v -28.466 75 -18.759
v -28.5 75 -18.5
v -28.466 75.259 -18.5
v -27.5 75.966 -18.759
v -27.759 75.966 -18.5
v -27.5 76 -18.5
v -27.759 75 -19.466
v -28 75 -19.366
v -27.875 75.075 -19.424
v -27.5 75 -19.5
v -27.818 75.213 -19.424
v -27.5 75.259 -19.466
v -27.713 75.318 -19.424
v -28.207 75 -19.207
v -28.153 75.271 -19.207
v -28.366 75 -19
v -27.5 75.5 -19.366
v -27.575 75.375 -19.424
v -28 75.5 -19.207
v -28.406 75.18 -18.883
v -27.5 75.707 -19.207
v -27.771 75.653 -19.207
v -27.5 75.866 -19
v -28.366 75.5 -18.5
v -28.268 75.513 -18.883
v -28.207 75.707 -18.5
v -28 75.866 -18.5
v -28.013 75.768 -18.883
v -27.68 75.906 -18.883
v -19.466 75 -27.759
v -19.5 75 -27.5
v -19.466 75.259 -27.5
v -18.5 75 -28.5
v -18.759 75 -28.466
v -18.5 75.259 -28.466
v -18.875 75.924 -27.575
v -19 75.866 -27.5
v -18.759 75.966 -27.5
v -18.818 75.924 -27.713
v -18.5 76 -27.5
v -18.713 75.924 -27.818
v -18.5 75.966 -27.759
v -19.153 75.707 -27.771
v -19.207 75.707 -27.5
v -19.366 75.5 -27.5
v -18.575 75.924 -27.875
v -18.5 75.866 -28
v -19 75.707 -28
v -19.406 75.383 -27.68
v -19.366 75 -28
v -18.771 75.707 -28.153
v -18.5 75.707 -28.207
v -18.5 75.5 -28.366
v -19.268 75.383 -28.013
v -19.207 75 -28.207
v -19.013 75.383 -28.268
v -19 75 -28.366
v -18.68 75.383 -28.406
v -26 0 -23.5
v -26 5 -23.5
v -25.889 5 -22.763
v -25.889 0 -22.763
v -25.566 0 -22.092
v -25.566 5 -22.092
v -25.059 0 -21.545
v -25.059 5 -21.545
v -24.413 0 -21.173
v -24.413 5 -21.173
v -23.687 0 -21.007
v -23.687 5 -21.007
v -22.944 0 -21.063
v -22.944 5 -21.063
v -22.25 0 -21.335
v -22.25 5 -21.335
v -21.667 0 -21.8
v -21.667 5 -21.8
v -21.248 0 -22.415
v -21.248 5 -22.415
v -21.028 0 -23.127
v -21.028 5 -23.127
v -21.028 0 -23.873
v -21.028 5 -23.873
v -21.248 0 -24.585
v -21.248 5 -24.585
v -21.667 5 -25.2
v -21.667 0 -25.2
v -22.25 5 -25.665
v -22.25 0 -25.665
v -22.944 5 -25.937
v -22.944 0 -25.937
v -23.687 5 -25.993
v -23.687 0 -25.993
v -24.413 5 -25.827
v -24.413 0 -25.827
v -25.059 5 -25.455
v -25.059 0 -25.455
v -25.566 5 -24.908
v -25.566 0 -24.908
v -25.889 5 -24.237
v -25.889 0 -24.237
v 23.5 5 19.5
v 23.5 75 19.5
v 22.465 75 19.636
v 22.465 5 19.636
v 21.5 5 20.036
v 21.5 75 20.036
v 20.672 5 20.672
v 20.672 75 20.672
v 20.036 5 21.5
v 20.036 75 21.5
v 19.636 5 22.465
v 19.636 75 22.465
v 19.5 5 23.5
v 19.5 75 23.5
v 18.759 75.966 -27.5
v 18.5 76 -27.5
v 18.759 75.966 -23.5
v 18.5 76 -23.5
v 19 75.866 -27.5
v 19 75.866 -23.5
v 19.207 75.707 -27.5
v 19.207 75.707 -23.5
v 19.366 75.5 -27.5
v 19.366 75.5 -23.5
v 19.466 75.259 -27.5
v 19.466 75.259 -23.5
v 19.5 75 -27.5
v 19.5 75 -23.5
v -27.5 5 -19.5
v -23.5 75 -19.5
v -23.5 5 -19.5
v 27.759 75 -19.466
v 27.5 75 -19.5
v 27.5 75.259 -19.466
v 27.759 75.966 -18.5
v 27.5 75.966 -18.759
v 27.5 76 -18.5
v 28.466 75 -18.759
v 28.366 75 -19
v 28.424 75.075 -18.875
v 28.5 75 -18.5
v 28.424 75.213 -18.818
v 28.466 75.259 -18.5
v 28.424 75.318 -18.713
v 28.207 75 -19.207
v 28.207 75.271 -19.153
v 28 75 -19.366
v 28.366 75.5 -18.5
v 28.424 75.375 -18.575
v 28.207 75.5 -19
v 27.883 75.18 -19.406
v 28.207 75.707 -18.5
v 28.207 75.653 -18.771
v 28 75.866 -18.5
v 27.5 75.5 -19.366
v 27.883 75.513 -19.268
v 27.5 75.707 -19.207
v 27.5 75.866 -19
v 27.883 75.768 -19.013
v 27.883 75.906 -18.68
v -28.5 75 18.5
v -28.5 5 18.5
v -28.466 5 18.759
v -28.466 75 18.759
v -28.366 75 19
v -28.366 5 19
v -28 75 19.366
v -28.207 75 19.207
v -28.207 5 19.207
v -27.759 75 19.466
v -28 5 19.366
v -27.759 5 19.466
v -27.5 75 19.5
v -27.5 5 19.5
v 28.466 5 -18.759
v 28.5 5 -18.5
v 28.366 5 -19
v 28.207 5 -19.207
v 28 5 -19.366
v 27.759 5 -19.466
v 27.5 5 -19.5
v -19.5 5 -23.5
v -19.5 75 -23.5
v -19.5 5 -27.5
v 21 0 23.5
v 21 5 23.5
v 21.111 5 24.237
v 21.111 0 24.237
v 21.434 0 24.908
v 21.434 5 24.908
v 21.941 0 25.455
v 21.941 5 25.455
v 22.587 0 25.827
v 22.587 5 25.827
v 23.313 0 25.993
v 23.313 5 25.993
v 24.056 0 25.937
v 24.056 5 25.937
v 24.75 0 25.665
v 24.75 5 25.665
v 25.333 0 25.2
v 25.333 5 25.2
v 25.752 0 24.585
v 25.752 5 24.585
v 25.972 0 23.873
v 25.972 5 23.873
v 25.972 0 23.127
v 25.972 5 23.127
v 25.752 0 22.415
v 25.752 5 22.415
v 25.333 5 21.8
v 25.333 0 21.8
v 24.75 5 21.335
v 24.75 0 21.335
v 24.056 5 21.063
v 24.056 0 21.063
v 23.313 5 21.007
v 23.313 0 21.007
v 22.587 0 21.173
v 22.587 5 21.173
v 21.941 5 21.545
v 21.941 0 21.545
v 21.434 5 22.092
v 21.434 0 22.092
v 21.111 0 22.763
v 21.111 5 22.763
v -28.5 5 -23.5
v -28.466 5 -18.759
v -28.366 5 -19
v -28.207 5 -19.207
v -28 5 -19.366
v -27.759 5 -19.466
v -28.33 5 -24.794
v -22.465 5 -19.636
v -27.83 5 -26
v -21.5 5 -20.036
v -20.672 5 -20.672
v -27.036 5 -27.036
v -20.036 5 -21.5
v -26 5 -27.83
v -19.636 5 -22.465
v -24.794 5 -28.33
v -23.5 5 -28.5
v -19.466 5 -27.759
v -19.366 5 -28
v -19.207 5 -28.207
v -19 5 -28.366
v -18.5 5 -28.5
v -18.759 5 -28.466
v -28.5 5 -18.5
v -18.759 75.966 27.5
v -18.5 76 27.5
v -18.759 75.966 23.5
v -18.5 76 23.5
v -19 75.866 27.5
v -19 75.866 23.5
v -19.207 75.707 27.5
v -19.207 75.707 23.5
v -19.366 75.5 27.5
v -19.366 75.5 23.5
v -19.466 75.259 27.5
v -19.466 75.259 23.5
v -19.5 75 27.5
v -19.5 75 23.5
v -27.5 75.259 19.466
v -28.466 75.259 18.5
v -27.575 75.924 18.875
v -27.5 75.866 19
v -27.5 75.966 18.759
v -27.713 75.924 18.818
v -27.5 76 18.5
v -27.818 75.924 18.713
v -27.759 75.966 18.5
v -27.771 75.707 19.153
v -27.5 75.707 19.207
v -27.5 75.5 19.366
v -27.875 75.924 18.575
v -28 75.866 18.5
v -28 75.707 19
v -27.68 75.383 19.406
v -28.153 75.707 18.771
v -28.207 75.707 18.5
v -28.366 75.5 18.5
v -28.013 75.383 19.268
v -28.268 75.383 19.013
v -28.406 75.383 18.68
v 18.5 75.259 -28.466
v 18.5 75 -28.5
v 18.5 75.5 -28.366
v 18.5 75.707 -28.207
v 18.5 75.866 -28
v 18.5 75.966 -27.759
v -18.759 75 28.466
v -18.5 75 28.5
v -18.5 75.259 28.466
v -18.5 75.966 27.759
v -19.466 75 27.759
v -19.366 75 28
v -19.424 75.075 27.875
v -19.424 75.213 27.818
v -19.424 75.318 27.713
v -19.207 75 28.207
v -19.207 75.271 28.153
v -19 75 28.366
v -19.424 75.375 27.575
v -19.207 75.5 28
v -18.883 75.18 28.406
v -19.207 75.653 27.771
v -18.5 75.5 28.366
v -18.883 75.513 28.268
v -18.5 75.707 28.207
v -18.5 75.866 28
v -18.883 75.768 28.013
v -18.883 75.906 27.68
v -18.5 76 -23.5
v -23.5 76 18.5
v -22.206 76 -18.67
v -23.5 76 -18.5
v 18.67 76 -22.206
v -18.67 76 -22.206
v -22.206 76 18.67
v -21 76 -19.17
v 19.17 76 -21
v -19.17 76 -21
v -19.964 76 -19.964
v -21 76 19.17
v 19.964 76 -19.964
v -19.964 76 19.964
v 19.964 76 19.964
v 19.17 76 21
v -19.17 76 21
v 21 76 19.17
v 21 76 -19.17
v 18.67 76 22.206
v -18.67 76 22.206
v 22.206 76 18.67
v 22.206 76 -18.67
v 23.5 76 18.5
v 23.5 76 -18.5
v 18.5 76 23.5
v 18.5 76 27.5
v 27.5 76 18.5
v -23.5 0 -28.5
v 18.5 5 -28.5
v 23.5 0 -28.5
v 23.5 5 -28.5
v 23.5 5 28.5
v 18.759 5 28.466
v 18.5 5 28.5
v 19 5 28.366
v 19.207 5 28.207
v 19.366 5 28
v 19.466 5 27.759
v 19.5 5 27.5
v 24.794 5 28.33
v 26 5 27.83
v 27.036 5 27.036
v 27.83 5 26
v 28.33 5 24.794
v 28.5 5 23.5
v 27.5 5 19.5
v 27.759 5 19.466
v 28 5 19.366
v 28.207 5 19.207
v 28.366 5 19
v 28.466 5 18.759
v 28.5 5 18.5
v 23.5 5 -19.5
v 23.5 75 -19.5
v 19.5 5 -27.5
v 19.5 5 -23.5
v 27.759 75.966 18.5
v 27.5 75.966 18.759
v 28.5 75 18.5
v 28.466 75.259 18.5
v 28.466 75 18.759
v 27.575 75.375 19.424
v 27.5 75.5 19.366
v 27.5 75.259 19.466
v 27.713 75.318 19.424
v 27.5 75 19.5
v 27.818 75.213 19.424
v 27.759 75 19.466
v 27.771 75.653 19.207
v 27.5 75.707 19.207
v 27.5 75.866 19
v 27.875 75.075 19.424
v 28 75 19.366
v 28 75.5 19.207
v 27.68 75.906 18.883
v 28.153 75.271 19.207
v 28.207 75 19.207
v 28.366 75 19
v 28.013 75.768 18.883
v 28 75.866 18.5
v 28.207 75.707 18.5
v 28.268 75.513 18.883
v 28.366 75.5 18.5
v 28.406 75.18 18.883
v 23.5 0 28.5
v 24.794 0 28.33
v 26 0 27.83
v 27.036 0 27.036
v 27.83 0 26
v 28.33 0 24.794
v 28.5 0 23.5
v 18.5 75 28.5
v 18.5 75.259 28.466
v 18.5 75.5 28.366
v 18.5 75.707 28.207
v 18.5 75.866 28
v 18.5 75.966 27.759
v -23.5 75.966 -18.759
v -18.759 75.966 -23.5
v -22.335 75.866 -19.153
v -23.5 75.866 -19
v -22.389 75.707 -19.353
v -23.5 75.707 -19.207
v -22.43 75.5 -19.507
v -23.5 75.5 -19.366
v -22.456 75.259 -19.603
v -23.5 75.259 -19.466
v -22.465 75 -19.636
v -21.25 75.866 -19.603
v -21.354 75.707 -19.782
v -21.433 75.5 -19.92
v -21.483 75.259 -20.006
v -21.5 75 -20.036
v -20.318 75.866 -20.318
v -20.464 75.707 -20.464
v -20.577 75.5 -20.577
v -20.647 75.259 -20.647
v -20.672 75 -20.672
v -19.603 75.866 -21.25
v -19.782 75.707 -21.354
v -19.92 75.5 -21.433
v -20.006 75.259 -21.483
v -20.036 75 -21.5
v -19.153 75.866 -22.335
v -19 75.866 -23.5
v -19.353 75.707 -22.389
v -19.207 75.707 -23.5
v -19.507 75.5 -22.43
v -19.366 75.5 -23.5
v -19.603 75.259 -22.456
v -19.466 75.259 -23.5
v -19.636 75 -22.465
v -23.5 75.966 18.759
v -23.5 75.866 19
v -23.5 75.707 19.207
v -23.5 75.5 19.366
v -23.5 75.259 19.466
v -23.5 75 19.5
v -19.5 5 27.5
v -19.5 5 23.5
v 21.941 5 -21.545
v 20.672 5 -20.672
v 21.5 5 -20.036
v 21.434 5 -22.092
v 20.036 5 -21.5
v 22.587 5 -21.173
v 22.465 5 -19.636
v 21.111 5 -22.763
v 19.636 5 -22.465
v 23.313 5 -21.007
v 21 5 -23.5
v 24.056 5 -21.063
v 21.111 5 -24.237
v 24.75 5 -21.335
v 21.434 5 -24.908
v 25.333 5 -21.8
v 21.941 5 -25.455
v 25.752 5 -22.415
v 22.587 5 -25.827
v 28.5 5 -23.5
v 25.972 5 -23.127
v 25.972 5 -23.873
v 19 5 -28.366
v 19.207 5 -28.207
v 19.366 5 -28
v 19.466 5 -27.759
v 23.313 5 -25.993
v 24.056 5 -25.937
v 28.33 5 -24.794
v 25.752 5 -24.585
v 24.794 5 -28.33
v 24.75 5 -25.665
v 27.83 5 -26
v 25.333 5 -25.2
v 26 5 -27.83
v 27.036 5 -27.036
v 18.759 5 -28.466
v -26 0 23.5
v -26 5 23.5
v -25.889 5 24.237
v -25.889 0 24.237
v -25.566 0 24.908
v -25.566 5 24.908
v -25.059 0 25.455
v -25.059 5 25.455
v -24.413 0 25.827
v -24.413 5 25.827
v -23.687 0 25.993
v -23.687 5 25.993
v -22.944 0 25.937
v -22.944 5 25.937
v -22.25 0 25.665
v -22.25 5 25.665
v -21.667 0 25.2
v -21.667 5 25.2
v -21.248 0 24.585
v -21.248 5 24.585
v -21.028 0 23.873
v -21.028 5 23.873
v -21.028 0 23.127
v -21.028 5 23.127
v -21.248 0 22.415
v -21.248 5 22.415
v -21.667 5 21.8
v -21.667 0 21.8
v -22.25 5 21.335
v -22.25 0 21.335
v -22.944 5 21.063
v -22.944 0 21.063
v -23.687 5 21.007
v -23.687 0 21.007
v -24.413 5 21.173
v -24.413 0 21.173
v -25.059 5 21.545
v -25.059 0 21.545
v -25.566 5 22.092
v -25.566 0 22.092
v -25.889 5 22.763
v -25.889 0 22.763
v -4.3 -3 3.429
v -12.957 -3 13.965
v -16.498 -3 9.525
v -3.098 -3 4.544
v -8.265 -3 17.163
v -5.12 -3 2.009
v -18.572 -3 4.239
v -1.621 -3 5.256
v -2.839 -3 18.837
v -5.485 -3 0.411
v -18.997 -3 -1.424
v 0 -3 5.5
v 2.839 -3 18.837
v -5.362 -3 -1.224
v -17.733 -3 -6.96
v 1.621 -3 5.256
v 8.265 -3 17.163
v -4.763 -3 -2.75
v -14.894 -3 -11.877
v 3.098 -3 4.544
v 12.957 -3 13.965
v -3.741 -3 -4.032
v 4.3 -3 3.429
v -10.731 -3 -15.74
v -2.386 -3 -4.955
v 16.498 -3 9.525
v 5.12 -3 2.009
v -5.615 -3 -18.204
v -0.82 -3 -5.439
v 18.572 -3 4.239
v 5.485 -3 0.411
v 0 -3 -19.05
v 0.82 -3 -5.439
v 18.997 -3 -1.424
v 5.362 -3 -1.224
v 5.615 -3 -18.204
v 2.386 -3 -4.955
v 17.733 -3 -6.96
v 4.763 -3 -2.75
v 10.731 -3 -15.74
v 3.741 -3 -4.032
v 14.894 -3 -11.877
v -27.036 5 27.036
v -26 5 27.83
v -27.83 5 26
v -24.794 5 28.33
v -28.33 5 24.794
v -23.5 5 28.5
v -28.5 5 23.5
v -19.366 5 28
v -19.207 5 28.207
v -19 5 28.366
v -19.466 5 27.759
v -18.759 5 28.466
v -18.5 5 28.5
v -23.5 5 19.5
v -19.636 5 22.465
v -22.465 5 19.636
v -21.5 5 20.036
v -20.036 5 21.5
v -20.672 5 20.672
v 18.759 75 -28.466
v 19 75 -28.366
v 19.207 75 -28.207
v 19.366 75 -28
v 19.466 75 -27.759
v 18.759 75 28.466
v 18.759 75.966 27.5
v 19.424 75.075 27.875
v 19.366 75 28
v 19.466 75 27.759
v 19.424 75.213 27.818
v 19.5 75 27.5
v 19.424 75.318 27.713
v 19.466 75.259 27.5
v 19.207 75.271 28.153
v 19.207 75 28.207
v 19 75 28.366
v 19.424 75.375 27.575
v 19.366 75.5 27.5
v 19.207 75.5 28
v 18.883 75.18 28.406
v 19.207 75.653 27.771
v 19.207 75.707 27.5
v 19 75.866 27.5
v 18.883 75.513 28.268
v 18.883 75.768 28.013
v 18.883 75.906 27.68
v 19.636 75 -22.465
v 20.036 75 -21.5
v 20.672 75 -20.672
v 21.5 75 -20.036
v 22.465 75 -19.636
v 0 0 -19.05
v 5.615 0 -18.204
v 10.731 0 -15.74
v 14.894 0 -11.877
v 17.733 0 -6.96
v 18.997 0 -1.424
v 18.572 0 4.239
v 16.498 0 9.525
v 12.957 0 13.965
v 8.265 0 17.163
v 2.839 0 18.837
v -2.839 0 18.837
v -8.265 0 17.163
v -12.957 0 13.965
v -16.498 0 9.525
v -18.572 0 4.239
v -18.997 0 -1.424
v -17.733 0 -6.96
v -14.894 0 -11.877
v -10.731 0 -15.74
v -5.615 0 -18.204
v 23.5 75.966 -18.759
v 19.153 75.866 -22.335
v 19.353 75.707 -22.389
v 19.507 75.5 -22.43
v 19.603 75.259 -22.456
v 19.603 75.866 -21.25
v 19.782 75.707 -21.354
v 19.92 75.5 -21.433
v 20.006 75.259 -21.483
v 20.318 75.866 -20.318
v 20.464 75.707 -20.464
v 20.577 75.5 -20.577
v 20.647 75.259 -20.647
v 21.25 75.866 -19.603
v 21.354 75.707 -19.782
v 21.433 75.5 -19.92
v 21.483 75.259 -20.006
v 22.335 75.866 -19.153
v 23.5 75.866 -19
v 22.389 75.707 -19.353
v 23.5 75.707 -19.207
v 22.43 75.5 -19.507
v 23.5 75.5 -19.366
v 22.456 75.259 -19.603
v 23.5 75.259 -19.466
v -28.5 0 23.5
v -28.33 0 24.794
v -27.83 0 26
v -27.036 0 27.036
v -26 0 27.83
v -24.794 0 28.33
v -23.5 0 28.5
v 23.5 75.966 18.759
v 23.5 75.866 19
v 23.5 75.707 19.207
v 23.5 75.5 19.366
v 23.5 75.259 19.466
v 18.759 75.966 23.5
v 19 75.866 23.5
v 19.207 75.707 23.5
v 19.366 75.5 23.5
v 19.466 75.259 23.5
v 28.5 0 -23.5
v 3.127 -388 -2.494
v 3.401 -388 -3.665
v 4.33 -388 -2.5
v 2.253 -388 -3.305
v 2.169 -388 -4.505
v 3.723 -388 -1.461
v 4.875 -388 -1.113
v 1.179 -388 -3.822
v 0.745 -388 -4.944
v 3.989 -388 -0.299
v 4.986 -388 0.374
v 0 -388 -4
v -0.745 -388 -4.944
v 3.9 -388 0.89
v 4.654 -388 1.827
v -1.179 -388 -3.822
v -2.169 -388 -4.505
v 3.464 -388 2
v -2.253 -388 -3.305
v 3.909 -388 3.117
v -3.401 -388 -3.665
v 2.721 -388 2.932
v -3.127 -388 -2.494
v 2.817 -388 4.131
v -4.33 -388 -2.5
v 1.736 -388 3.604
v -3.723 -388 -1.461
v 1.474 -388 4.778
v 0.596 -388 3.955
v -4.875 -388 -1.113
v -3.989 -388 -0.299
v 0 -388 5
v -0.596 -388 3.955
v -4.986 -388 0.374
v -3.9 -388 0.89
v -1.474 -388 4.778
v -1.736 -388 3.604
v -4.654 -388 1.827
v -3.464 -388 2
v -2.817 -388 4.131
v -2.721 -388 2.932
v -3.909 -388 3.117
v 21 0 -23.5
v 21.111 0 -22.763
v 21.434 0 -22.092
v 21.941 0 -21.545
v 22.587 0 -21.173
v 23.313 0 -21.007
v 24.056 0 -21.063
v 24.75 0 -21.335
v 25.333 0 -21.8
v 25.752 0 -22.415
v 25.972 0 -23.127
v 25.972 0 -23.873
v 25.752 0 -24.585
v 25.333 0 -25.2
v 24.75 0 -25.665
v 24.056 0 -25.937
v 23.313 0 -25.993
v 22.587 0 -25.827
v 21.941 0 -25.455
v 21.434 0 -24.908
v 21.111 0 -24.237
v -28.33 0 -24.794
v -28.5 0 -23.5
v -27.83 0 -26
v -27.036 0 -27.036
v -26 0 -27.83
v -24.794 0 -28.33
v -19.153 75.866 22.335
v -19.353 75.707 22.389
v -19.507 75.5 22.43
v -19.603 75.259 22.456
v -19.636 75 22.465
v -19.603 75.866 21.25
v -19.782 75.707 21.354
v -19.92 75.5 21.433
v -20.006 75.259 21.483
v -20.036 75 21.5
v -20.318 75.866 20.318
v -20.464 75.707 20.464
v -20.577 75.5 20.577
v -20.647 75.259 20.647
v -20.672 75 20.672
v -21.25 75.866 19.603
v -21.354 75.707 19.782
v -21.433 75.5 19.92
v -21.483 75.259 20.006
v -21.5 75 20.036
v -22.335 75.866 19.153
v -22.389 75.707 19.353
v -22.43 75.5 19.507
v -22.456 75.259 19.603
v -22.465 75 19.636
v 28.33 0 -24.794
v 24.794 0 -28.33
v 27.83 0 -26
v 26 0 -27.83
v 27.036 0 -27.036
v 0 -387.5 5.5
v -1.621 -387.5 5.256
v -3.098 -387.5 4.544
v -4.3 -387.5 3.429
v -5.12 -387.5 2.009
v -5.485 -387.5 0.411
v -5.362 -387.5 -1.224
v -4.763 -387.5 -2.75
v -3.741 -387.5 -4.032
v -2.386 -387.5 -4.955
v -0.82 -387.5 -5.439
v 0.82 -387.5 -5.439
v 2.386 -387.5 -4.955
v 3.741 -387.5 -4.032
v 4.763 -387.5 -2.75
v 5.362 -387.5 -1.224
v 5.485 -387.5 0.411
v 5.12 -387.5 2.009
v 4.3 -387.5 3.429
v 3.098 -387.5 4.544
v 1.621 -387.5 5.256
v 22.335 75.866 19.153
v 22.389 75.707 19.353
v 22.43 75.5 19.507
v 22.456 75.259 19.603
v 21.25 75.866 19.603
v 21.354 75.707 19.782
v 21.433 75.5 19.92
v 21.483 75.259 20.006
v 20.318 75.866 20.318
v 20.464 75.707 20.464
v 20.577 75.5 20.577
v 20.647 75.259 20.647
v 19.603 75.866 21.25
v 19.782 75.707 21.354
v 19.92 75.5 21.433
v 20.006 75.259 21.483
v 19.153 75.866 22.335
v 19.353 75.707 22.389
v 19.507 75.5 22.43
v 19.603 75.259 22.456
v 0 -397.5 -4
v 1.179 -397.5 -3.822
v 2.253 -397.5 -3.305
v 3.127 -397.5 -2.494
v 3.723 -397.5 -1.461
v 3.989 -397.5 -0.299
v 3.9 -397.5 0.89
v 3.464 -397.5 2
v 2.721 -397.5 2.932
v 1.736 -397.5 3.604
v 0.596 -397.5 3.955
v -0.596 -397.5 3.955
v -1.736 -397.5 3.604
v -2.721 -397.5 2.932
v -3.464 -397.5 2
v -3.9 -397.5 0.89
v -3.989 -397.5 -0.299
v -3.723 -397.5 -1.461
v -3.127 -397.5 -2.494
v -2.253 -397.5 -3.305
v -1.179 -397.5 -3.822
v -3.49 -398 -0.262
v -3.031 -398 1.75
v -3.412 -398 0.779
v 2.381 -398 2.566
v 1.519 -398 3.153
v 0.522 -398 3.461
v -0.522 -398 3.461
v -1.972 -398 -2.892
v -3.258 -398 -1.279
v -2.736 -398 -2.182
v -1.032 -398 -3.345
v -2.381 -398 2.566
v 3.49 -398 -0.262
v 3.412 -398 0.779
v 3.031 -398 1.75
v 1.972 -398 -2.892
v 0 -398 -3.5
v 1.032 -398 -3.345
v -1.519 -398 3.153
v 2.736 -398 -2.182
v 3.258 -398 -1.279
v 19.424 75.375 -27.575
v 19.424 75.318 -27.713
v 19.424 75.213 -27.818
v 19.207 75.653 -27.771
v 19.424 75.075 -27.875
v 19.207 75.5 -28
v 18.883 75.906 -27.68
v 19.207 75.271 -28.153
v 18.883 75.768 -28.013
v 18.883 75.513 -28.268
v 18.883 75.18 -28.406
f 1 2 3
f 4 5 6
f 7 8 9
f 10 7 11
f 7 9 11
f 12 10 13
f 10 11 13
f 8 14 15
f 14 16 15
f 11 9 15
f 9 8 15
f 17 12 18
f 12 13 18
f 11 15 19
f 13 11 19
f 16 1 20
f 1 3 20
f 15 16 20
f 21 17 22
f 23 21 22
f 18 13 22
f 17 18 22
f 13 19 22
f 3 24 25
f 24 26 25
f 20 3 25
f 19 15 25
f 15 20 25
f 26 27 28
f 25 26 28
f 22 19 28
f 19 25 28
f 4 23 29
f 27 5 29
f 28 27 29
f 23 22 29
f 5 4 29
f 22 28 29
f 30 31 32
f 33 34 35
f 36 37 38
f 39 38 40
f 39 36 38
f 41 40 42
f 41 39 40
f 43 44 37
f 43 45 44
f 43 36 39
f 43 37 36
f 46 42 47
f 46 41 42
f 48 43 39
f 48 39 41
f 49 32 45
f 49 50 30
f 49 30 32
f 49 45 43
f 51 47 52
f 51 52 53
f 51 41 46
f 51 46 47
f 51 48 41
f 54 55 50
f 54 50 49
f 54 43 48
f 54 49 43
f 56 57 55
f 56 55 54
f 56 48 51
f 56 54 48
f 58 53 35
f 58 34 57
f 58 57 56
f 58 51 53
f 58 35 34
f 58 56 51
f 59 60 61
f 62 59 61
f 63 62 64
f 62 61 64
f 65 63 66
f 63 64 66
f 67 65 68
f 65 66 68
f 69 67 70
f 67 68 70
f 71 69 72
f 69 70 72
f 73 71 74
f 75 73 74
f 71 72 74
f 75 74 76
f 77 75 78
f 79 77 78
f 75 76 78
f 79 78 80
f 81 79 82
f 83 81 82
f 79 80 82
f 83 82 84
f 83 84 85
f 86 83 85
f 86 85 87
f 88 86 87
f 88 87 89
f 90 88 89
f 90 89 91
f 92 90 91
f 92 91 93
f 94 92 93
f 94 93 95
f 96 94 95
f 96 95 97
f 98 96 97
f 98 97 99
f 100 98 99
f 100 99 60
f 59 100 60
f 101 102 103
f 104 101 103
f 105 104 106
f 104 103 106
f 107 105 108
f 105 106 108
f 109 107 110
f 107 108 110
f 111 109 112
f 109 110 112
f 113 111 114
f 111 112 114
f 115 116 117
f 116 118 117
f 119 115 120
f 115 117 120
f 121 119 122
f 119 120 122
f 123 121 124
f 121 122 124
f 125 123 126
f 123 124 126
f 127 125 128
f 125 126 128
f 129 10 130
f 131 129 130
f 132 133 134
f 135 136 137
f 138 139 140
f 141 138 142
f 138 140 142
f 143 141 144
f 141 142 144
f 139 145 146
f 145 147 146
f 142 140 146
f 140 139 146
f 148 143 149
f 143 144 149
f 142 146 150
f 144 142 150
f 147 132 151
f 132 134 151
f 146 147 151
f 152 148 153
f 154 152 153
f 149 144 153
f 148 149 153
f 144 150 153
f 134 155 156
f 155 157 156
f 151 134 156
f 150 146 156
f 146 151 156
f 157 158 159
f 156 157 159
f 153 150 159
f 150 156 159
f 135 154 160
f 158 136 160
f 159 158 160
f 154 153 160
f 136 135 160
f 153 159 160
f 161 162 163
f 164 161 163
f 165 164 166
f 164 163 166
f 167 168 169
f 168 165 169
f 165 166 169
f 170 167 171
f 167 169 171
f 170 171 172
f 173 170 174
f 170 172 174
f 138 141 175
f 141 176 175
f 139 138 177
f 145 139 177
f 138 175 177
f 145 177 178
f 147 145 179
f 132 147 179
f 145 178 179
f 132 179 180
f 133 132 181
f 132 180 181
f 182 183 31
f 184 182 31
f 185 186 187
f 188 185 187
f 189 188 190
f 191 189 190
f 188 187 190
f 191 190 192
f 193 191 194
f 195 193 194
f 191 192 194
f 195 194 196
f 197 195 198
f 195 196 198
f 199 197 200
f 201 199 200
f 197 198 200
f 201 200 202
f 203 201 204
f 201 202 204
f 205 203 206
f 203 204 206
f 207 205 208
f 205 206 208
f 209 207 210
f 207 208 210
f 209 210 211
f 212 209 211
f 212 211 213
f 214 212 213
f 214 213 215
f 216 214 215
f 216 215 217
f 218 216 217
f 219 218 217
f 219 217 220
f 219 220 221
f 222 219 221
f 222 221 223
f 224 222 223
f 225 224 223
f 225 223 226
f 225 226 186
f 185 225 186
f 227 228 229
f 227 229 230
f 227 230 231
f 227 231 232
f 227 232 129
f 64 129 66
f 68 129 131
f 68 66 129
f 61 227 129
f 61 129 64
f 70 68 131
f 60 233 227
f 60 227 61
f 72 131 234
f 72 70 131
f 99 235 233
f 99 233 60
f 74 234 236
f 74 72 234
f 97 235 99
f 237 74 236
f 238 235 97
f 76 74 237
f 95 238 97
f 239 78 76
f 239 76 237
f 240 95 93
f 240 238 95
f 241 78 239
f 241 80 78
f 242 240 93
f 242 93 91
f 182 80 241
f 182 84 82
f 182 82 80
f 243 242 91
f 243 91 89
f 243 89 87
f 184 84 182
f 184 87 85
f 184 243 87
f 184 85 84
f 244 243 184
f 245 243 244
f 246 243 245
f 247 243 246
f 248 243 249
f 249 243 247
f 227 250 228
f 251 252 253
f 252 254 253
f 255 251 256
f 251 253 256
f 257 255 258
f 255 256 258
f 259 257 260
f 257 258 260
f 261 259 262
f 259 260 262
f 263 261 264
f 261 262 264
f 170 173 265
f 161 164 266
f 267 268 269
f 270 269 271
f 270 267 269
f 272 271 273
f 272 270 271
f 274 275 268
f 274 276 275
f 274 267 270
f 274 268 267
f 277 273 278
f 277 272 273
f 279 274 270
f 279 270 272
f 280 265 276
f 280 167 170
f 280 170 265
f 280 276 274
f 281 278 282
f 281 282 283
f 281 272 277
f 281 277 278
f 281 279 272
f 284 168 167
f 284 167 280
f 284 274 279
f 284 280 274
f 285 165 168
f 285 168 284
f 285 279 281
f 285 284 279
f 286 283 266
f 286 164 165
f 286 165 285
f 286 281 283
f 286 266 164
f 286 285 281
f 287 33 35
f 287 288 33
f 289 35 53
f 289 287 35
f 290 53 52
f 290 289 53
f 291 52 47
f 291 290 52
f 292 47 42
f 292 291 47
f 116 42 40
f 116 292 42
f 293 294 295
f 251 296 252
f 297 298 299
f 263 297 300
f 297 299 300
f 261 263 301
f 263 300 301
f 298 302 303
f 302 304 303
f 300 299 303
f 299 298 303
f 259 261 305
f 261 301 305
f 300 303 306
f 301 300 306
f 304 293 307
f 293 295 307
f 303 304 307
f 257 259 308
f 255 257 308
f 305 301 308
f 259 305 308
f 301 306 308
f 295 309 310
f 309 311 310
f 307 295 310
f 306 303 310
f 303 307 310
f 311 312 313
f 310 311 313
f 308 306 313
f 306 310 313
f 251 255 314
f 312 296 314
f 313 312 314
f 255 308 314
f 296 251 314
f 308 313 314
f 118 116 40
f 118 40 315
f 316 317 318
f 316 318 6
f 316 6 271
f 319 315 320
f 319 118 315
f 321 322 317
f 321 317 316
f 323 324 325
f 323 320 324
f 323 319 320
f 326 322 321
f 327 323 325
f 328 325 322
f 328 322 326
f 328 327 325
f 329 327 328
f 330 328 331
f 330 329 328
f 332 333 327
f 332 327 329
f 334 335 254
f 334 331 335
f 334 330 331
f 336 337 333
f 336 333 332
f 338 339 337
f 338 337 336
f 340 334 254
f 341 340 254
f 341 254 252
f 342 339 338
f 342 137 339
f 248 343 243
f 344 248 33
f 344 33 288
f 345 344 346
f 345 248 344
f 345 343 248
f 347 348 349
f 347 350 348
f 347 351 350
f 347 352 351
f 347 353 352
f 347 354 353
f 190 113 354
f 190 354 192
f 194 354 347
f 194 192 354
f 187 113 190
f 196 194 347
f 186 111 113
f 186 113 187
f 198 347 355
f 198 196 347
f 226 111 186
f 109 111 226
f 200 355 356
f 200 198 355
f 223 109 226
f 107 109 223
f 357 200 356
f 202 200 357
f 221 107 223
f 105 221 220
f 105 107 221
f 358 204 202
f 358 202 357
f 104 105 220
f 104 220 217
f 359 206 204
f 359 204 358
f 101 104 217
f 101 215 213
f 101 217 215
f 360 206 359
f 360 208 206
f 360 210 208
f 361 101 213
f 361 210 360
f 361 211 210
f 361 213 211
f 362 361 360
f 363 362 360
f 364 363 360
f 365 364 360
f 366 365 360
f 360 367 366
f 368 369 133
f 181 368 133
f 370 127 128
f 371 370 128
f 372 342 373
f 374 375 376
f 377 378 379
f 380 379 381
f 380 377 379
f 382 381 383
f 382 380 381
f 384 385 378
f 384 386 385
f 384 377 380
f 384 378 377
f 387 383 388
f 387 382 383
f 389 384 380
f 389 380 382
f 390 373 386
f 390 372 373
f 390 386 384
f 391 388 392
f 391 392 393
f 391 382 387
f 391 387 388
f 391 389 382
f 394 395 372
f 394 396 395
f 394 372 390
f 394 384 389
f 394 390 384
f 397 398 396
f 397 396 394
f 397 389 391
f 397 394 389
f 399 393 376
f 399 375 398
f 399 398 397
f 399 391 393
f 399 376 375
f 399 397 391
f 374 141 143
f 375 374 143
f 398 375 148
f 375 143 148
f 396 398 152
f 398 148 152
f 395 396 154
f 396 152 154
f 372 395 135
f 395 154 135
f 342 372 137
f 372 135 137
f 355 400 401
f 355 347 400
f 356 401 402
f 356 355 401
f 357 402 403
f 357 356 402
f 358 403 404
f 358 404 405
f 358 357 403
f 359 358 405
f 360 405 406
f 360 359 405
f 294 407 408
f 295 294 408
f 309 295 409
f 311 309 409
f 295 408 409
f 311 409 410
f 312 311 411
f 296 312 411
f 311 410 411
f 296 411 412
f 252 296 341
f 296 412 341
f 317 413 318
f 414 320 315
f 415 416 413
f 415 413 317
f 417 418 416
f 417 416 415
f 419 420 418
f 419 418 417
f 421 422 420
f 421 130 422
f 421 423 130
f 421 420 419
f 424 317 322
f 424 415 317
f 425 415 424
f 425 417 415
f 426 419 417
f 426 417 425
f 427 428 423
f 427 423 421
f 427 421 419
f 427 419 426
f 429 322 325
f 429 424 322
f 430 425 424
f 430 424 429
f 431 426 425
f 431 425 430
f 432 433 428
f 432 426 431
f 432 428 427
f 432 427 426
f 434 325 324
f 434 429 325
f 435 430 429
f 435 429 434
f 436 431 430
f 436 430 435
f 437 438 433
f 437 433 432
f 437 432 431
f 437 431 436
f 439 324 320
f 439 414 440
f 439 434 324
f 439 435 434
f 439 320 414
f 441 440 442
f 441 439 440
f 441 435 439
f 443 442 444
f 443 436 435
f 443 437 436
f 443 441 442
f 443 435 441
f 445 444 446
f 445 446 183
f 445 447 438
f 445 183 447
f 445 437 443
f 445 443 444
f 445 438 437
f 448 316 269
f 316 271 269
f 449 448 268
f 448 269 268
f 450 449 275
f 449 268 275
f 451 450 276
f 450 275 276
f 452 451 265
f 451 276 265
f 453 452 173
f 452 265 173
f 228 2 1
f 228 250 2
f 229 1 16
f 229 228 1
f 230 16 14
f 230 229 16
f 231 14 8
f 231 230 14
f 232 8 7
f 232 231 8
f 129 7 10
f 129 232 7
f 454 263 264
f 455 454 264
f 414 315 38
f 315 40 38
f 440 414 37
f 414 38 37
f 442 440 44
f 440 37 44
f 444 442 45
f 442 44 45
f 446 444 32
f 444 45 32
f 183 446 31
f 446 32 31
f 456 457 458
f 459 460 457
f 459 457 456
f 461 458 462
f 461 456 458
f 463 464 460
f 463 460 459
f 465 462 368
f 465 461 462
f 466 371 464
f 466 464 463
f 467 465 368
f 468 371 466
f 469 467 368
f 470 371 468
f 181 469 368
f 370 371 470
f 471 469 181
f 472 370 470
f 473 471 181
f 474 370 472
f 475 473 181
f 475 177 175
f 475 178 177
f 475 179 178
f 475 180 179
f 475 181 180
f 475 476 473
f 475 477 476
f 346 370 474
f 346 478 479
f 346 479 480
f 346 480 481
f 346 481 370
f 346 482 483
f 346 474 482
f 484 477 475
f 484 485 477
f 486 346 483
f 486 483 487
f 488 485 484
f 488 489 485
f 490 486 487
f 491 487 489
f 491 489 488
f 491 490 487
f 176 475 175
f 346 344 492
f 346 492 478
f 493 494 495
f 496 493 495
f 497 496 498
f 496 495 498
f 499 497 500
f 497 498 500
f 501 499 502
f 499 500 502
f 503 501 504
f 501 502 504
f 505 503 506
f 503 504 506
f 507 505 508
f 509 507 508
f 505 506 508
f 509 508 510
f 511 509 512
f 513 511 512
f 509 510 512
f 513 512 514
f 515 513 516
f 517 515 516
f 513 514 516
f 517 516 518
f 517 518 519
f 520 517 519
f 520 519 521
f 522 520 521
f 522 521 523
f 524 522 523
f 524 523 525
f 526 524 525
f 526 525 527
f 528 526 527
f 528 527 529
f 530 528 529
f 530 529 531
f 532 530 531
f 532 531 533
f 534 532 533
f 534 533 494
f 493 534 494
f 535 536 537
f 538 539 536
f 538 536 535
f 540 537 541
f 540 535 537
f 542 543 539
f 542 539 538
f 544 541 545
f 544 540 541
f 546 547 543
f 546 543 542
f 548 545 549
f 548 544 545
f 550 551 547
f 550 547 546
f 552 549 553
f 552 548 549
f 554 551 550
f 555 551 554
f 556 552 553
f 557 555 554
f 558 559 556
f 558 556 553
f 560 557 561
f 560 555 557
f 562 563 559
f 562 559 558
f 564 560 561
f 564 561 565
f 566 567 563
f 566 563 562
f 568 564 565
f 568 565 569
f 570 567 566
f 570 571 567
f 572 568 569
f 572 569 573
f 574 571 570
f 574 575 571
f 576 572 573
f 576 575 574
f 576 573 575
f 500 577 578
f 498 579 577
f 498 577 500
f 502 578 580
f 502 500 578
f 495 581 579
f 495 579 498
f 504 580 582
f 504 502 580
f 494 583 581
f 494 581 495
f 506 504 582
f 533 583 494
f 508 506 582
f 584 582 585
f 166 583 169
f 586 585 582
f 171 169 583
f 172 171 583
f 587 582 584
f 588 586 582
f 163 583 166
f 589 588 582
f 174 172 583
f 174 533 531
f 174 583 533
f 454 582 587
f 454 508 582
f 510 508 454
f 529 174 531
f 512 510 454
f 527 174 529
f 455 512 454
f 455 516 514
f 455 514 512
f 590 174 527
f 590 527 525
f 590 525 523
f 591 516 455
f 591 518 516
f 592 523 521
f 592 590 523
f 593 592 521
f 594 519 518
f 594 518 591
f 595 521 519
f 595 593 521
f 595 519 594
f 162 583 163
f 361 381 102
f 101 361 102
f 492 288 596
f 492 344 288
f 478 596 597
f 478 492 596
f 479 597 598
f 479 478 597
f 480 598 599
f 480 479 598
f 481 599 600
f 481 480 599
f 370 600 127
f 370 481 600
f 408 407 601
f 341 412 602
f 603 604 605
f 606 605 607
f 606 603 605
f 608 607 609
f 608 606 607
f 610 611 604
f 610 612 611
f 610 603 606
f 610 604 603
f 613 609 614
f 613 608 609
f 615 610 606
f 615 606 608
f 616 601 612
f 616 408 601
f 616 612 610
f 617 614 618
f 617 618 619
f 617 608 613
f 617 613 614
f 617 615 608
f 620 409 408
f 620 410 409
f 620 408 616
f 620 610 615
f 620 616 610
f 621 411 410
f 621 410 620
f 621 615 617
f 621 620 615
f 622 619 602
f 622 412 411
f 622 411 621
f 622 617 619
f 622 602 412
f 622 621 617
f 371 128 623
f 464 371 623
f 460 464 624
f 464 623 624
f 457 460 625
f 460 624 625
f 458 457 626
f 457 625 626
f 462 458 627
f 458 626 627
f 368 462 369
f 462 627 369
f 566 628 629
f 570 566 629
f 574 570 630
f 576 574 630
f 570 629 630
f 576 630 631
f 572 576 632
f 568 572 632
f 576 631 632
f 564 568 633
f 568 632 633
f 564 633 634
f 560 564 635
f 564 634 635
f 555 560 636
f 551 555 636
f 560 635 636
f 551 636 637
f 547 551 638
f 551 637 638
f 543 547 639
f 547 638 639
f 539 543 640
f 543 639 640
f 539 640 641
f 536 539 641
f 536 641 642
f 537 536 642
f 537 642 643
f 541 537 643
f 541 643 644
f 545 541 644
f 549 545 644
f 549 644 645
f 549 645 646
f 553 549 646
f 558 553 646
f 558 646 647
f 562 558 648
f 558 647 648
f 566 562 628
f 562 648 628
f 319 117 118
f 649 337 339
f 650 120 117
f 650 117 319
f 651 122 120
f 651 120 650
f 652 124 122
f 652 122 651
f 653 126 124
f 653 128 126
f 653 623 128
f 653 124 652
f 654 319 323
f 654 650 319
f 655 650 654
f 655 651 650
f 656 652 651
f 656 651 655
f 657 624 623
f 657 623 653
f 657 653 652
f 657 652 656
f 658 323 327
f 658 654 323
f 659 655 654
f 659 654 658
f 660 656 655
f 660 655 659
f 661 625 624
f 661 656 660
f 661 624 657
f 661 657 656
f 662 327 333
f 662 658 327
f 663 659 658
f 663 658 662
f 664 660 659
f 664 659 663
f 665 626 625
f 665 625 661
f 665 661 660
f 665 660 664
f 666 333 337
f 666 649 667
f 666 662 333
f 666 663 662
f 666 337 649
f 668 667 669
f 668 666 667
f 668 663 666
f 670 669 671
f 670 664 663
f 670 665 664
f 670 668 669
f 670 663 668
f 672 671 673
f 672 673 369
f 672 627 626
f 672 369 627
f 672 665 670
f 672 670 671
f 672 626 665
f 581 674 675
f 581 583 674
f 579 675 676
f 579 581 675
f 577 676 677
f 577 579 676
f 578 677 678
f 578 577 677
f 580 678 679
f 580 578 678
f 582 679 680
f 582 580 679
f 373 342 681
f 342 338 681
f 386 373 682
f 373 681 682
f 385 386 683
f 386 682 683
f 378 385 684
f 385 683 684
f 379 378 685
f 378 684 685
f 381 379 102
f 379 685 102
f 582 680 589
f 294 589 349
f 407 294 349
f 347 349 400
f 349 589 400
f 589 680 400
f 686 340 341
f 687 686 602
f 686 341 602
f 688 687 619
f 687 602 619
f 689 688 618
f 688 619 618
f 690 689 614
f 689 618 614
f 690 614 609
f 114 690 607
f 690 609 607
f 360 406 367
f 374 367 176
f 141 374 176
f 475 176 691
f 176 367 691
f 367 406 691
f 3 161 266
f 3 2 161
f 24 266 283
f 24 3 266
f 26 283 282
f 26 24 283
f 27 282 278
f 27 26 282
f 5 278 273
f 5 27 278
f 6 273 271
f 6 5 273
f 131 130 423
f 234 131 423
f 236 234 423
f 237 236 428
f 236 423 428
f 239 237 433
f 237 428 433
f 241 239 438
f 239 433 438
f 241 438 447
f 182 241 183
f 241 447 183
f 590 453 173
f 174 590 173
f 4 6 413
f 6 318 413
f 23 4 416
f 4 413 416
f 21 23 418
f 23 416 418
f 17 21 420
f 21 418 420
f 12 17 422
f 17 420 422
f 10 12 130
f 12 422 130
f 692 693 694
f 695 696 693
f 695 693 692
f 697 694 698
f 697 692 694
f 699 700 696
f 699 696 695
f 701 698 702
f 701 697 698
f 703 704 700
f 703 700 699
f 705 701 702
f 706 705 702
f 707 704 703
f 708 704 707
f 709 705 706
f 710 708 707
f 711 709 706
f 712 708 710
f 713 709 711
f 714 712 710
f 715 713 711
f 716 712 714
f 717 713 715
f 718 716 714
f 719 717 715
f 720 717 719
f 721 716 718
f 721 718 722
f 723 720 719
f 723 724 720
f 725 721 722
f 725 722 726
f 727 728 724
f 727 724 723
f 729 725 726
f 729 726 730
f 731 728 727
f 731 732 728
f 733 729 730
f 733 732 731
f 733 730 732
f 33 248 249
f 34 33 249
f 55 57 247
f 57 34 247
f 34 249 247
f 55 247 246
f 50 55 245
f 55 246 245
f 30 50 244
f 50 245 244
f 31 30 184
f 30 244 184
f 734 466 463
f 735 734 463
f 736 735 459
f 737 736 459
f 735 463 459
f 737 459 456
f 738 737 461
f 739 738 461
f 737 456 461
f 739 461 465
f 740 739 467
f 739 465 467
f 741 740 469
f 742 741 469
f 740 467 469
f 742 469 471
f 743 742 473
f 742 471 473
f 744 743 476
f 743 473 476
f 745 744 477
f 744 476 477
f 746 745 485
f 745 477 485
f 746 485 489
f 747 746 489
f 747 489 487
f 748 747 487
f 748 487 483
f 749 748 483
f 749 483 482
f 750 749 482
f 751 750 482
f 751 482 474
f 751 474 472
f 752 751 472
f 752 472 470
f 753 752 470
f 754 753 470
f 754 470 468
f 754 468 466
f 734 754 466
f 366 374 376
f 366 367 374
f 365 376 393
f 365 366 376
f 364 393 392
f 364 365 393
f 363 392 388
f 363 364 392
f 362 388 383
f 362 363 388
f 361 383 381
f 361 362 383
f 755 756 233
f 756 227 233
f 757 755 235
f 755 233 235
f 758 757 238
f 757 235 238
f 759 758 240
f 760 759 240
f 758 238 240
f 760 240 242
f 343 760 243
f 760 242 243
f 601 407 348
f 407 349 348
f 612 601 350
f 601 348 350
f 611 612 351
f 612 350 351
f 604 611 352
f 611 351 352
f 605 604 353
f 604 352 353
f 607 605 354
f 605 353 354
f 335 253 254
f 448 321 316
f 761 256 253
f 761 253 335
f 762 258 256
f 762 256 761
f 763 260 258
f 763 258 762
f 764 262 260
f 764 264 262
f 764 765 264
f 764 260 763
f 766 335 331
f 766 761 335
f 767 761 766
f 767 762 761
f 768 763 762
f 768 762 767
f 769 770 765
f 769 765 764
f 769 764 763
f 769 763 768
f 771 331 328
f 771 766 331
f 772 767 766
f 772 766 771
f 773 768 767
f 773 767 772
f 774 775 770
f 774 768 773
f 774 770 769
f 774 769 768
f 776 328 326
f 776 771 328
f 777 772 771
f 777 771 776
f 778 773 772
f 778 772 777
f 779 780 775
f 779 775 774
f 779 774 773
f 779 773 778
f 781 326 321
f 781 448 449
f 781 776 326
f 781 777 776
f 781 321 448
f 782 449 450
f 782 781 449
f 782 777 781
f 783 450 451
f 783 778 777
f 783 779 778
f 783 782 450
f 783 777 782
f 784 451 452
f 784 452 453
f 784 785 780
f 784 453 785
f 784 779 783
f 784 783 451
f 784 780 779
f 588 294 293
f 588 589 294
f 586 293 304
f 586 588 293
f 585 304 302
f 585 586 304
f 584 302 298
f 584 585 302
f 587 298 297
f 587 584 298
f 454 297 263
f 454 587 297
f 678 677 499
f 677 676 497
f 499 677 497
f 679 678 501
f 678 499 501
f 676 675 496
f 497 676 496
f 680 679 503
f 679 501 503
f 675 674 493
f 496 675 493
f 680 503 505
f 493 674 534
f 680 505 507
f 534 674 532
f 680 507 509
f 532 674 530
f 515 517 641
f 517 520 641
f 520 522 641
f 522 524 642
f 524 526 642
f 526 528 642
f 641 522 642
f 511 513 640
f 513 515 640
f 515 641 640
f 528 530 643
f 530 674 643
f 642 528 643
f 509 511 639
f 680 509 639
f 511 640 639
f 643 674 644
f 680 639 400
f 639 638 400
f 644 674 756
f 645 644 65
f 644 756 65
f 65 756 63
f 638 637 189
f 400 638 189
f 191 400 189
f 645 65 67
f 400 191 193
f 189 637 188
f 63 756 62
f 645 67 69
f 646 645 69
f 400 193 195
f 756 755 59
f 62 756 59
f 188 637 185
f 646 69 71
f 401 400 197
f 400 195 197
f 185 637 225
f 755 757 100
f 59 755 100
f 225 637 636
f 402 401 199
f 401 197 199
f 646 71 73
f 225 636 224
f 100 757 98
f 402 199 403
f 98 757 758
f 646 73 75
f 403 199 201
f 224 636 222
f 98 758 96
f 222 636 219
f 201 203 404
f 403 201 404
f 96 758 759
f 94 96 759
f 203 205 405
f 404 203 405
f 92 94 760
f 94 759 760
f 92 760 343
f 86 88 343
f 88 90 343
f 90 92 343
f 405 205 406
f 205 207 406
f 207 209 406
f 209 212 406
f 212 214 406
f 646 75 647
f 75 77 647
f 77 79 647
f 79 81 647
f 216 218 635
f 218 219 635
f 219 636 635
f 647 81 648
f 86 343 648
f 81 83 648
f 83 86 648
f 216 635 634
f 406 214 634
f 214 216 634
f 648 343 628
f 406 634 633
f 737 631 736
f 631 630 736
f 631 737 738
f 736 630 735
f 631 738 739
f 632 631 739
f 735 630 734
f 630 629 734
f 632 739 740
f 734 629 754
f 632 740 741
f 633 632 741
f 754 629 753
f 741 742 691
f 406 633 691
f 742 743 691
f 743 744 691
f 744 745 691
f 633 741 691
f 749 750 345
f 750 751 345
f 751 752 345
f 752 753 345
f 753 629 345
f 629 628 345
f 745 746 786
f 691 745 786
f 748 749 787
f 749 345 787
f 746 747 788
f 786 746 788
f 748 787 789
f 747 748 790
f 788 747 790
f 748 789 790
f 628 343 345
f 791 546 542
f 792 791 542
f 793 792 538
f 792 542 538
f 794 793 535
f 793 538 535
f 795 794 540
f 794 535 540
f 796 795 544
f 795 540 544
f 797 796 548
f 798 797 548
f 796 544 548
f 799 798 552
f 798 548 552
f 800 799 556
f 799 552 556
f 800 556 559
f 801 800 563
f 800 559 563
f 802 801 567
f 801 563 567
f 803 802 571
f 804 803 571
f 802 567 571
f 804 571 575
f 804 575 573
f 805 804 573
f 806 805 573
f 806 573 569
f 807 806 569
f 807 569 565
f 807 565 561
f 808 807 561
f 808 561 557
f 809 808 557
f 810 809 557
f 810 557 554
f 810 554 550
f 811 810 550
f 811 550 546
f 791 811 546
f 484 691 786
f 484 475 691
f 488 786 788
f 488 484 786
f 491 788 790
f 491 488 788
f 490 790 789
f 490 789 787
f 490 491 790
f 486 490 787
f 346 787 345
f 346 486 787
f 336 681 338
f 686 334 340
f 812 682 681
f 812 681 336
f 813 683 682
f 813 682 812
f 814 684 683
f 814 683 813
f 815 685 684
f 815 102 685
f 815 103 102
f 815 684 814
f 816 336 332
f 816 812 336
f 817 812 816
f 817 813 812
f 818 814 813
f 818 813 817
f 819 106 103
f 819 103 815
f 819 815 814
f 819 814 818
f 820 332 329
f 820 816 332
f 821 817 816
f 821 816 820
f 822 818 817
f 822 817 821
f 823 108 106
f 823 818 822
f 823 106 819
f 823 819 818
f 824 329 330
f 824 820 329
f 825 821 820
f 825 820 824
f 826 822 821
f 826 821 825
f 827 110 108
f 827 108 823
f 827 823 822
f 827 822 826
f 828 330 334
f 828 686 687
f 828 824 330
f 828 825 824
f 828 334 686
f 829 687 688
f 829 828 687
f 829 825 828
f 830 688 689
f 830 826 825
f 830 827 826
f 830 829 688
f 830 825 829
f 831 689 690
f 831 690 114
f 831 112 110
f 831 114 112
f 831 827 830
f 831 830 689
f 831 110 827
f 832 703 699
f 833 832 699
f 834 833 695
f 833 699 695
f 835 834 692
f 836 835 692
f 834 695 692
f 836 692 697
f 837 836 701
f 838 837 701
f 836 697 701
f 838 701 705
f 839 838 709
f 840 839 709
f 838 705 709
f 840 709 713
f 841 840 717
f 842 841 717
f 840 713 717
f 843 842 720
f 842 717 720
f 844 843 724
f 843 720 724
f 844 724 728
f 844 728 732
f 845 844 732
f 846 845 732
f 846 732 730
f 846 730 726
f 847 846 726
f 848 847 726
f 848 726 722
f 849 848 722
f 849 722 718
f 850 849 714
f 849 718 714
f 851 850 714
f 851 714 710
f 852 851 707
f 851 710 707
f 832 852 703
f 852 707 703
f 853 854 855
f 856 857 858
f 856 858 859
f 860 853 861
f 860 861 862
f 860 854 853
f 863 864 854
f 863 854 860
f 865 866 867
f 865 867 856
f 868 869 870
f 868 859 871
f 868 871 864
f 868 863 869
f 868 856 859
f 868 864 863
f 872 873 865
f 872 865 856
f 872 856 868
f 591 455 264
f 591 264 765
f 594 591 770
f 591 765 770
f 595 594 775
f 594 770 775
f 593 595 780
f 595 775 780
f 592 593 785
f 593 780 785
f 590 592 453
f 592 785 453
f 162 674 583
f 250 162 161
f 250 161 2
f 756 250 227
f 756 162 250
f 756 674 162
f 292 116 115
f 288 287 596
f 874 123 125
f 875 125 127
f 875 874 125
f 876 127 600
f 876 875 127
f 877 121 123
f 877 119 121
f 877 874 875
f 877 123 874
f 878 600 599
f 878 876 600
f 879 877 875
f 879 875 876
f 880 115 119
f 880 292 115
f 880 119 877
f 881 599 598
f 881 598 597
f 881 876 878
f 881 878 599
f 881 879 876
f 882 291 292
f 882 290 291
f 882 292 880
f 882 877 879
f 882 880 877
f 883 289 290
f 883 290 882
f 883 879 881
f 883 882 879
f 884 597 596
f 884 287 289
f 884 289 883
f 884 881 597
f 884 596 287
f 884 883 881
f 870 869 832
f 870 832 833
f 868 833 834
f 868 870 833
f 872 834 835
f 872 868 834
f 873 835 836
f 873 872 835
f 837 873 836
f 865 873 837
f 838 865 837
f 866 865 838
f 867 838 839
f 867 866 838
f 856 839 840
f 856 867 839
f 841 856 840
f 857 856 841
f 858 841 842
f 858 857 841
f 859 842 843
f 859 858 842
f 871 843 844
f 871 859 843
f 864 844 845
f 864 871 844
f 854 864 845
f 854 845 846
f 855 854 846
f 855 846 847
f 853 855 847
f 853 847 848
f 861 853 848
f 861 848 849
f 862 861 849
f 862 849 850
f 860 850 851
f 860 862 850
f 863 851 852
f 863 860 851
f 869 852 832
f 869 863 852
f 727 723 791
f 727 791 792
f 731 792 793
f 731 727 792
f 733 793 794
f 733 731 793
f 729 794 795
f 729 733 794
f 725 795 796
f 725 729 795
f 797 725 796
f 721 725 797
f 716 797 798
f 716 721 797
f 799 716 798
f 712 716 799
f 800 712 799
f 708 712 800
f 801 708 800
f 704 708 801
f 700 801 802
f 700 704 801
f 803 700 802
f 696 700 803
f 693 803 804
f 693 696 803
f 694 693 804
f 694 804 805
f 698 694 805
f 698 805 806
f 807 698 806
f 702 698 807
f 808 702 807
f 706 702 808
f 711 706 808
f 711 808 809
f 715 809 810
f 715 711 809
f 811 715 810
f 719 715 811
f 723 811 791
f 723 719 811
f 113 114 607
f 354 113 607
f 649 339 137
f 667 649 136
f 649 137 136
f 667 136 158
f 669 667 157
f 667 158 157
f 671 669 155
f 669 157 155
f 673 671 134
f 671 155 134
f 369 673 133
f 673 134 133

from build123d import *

# Parameters (mm, degrees)
SKETCH1_W                = 57
SKETCH1_H                = 57
EXTRUDE1_DEPTH           = 76
F_5_0_5_DIAMETER_HOLE1_D = 5
SKETCH6_R                = 4
SKETCH6_R_2              = 2.5
EXTRUDE4_DEPTH           = 71
FILLET1_R                = 5
SKETCH7_R                = 3
EXTRUDE5_DEPTH           = 101
SKETCH8_R                = 19.05
EXTRUDE6_DEPTH           = 3
FILLET2_R                = 1
SKETCH9_R                = 5.5
BOSS_EXTRUDE1_DEPTH      = 388
CHAMFER1_SIZE            = 0.5
SKETCH10_R               = 4
BOSS_EXTRUDE2_DEPTH      = 10
CHAMFER2_SIZE            = 0.5


with BuildPart() as part:
    # Sketch1 → Extrude1 (new body)
    with BuildSketch(Plane(origin=(0, 0, 0), x_dir=(1, 0, 0), z_dir=(0, 1, 0))):
        Rectangle(SKETCH1_W, SKETCH1_H)
    extrude(amount=EXTRUDE1_DEPTH)

    # Ø5.0 (5) Diameter Hole1 (through all)
    with Locations(Plane.XZ):
        with Locations((-23.5, 23.5), (23.5, 23.5), (23.5, -23.5), (-23.5, -23.5)):
            Hole(F_5_0_5_DIAMETER_HOLE1_D / 2)

    # Sketch6 → Extrude4 (cut)
    # profile 1 of 12: a face of its own
    with BuildSketch(Plane(origin=(0, 76, 0), x_dir=(1, 0, 0), z_dir=(0, 1, 0))):
        Polygon((-28.5, 28.5), (-19.5, 28.5), (-19.5, 32.511741208), (-33.908905561, 32.511741208), (-33.908905561, 19.5), (-28.5, 19.5), align=None)
    # profile 2 of 12: a face of its own
    with BuildSketch(Plane(origin=(0, 76, 0), x_dir=(1, 0, 0), z_dir=(0, 1, 0))):
        with BuildLine():
            ThreePointArc((-23.5, 19.5), (-26.328427125, 26.328427125), (-19.5, 23.5))
            Line((-19.5, 23.5), (-19.5, 28.5))
            Line((-19.5, 28.5), (-28.5, 28.5))
            Line((-28.5, 28.5), (-28.5, 19.5))
            Line((-28.5, 19.5), (-23.5, 19.5))
        make_face()
    # profile 3 of 12: a face of its own
    with BuildSketch(Plane(origin=(0, 76, 0), x_dir=(1, 0, 0), z_dir=(0, 1, 0))):
        with Locations((-23.5, 23.5)):
            Circle(SKETCH6_R)
        with Locations(Location((-23.5, 23.5, 0), (0, 0, 90))):
            Circle(SKETCH6_R_2, mode=Mode.SUBTRACT)
    # profile 4 of 12: a face of its own
    with BuildSketch(Plane(origin=(0, 76, 0), x_dir=(1, 0, 0), z_dir=(0, 1, 0))):
        Polygon((19.5, 36.471560472), (19.5, 28.5), (28.5, 28.5), (28.5, 19.5), (41.168352552, 19.5), (41.168352552, 36.471560472), align=None)
    # profile 5 of 12: a face of its own
    with BuildSketch(Plane(origin=(0, 76, 0), x_dir=(1, 0, 0), z_dir=(0, 1, 0))):
        with BuildLine():
            Line((28.5, 28.5), (19.5, 28.5))
            Line((19.5, 28.5), (19.5, 23.5))
            ThreePointArc((19.5, 23.5), (23.5, 27.5), (27.5, 23.5))
            ThreePointArc((27.5, 23.5), (26.328427125, 20.671572875), (23.5, 19.5))
            Line((23.5, 19.5), (28.5, 19.5))
            Line((28.5, 19.5), (28.5, 28.5))
        make_face()
    # profile 6 of 12: a face of its own
    with BuildSketch(Plane(origin=(0, 76, 0), x_dir=(1, 0, 0), z_dir=(0, 1, 0))):
        with Locations((23.5, 23.5)):
            Circle(SKETCH6_R)
        with Locations(Location((23.5, 23.5, 0), (0, 0, 90))):
            Circle(SKETCH6_R_2, mode=Mode.SUBTRACT)
    # profile 7 of 12: a face of its own
    with BuildSketch(Plane(origin=(0, 76, 0), x_dir=(1, 0, 0), z_dir=(0, 1, 0))):
        with Locations((23.5, -23.5)):
            Circle(SKETCH6_R)
        with Locations(Location((23.5, -23.5, 0), (0, 0, 90))):
            Circle(SKETCH6_R_2, mode=Mode.SUBTRACT)
    # profile 8 of 12: a face of its own
    with BuildSketch(Plane(origin=(0, 76, 0), x_dir=(1, 0, 0), z_dir=(0, 1, 0))):
        with BuildLine():
            Line((28.5, -28.5), (28.5, -19.5))
            Line((28.5, -19.5), (23.5, -19.5))
            ThreePointArc((23.5, -19.5), (26.328427125, -20.671572875), (27.5, -23.5))
            ThreePointArc((27.5, -23.5), (23.5, -27.5), (19.5, -23.5))
            Line((19.5, -23.5), (19.5, -28.5))
            Line((19.5, -28.5), (28.5, -28.5))
        make_face()
    # profile 9 of 12: a face of its own
    with BuildSketch(Plane(origin=(0, 76, 0), x_dir=(1, 0, 0), z_dir=(0, 1, 0))):
        Polygon((44.252209519, -19.5), (28.5, -19.5), (28.5, -28.5), (19.5, -28.5), (19.5, -40.050429997), (44.252209519, -40.050429997), align=None)
    # profile 10 of 12: a face of its own
    with BuildSketch(Plane(origin=(0, 76, 0), x_dir=(1, 0, 0), z_dir=(0, 1, 0))):
        Polygon((-28.5, -28.5), (-28.5, -19.5), (-37.670786859, -19.5), (-37.670786859, -37.828231874), (-19.5, -37.828231874), (-19.5, -28.5), align=None)
    # profile 11 of 12: a face of its own
    with BuildSketch(Plane(origin=(0, 76, 0), x_dir=(1, 0, 0), z_dir=(0, 1, 0))):
        with BuildLine():
            Line((-23.5, -19.5), (-28.5, -19.5))
            Line((-28.5, -19.5), (-28.5, -28.5))
            Line((-28.5, -28.5), (-19.5, -28.5))
            Line((-19.5, -28.5), (-19.5, -23.5))
            ThreePointArc((-19.5, -23.5), (-26.328427125, -26.328427125), (-23.5, -19.5))
        make_face()
    # profile 12 of 12: a face of its own
    with BuildSketch(Plane(origin=(0, 76, 0), x_dir=(1, 0, 0), z_dir=(0, 1, 0))):
        with Locations((-23.5, -23.5)):
            Circle(SKETCH6_R)
        with Locations(Location((-23.5, -23.5, 0), (0, 0, 90))):
            Circle(SKETCH6_R_2, mode=Mode.SUBTRACT)
    extrude(amount=-EXTRUDE4_DEPTH, mode=Mode.SUBTRACT)

    # Fillet1
    fillet1_edges = [part.edges().sort_by_distance(p)[0] for p in [
        (-28.5, 2.5, 28.5),
        (-28.5, 2.5, -28.5),
        (28.5, 2.5, -28.5),
        (28.5, 2.5, 28.5),
    ]]
    fillet(fillet1_edges, radius=FILLET1_R)



with BuildPart() as body_2:
    # Sketch7 → Extrude5 (new body)
    with BuildSketch(Plane(origin=(0, 76, 0), x_dir=(1, 0, 0), z_dir=(0, 1, 0))):
        with Locations(Location((0, 0, 0), (0, 0, 270))):
            Circle(SKETCH7_R)
    extrude(amount=-EXTRUDE5_DEPTH)


with BuildPart() as part_1:
    add(part.part)

    add(body_2.part)  # Extrude6 merges body 2
    # Sketch8 → Extrude6 (add)
    with BuildSketch(Plane.XZ):
        with Locations(Location((0, 0, 0), (0, 0, 270))):
            Circle(SKETCH8_R)
    extrude(amount=EXTRUDE6_DEPTH)

    # Fillet2
    fillet2_edges = [part_1.edges().sort_by_distance(p)[0] for p in [
        (-28.5, 40.5, 19.5),
        (0, 76, 28.5),
        (-19.5, 40.5, 28.5),
        (-19.5, 76, 26),
        (-20.671572875, 76, 20.671572875),
        (-26, 76, 19.5),
        (-28.5, 76, 0),
        (-28.5, 40.5, -19.5),
        (-19.5, 40.5, -28.5),
        (-19.5, 76, -26),
        (-26, 76, -19.5),
        (-20.671572875, 76, -20.671572875),
        (0, 76, -28.5),
        (19.5, 76, -26),
        (26, 76, -19.5),
        (20.671572875, 76, -20.671572875),
        (19.5, 40.5, -28.5),
        (28.5, 40.5, -19.5),
        (19.5, 40.5, 28.5),
        (28.5, 76, 0),
        (26, 76, 19.5),
        (19.5, 76, 26),
        (20.671572875, 76, 20.671572875),
        (28.5, 40.5, 19.5),
    ]]
    fillet(fillet2_edges, radius=FILLET2_R)

    # Sketch9 → Boss-Extrude1 (add)
    with BuildSketch(Plane.XZ):
        with Locations(Location((0, 0, 0), (0, 0, 90))):
            Circle(SKETCH9_R)
    extrude(amount=BOSS_EXTRUDE1_DEPTH)

    # Chamfer1
    chamfer1_edges = [part_1.edges().sort_by_distance(p)[0] for p in [
        (0, -388, -5.5),
    ]]
    chamfer(chamfer1_edges, length=CHAMFER1_SIZE)

    # Sketch10 → Boss-Extrude2 (add)
    with BuildSketch(Plane.XZ.offset(388)):
        with Locations(Location((0, 0, 0), (0, 0, 270))):
            Circle(SKETCH10_R)
    extrude(amount=BOSS_EXTRUDE2_DEPTH)

    # Chamfer2
    chamfer2_edges = [part_1.edges().sort_by_distance(p)[0] for p in [
        (0, -398, 4),
    ]]
    chamfer(chamfer2_edges, length=CHAMFER2_SIZE)


solid = part_1.part
